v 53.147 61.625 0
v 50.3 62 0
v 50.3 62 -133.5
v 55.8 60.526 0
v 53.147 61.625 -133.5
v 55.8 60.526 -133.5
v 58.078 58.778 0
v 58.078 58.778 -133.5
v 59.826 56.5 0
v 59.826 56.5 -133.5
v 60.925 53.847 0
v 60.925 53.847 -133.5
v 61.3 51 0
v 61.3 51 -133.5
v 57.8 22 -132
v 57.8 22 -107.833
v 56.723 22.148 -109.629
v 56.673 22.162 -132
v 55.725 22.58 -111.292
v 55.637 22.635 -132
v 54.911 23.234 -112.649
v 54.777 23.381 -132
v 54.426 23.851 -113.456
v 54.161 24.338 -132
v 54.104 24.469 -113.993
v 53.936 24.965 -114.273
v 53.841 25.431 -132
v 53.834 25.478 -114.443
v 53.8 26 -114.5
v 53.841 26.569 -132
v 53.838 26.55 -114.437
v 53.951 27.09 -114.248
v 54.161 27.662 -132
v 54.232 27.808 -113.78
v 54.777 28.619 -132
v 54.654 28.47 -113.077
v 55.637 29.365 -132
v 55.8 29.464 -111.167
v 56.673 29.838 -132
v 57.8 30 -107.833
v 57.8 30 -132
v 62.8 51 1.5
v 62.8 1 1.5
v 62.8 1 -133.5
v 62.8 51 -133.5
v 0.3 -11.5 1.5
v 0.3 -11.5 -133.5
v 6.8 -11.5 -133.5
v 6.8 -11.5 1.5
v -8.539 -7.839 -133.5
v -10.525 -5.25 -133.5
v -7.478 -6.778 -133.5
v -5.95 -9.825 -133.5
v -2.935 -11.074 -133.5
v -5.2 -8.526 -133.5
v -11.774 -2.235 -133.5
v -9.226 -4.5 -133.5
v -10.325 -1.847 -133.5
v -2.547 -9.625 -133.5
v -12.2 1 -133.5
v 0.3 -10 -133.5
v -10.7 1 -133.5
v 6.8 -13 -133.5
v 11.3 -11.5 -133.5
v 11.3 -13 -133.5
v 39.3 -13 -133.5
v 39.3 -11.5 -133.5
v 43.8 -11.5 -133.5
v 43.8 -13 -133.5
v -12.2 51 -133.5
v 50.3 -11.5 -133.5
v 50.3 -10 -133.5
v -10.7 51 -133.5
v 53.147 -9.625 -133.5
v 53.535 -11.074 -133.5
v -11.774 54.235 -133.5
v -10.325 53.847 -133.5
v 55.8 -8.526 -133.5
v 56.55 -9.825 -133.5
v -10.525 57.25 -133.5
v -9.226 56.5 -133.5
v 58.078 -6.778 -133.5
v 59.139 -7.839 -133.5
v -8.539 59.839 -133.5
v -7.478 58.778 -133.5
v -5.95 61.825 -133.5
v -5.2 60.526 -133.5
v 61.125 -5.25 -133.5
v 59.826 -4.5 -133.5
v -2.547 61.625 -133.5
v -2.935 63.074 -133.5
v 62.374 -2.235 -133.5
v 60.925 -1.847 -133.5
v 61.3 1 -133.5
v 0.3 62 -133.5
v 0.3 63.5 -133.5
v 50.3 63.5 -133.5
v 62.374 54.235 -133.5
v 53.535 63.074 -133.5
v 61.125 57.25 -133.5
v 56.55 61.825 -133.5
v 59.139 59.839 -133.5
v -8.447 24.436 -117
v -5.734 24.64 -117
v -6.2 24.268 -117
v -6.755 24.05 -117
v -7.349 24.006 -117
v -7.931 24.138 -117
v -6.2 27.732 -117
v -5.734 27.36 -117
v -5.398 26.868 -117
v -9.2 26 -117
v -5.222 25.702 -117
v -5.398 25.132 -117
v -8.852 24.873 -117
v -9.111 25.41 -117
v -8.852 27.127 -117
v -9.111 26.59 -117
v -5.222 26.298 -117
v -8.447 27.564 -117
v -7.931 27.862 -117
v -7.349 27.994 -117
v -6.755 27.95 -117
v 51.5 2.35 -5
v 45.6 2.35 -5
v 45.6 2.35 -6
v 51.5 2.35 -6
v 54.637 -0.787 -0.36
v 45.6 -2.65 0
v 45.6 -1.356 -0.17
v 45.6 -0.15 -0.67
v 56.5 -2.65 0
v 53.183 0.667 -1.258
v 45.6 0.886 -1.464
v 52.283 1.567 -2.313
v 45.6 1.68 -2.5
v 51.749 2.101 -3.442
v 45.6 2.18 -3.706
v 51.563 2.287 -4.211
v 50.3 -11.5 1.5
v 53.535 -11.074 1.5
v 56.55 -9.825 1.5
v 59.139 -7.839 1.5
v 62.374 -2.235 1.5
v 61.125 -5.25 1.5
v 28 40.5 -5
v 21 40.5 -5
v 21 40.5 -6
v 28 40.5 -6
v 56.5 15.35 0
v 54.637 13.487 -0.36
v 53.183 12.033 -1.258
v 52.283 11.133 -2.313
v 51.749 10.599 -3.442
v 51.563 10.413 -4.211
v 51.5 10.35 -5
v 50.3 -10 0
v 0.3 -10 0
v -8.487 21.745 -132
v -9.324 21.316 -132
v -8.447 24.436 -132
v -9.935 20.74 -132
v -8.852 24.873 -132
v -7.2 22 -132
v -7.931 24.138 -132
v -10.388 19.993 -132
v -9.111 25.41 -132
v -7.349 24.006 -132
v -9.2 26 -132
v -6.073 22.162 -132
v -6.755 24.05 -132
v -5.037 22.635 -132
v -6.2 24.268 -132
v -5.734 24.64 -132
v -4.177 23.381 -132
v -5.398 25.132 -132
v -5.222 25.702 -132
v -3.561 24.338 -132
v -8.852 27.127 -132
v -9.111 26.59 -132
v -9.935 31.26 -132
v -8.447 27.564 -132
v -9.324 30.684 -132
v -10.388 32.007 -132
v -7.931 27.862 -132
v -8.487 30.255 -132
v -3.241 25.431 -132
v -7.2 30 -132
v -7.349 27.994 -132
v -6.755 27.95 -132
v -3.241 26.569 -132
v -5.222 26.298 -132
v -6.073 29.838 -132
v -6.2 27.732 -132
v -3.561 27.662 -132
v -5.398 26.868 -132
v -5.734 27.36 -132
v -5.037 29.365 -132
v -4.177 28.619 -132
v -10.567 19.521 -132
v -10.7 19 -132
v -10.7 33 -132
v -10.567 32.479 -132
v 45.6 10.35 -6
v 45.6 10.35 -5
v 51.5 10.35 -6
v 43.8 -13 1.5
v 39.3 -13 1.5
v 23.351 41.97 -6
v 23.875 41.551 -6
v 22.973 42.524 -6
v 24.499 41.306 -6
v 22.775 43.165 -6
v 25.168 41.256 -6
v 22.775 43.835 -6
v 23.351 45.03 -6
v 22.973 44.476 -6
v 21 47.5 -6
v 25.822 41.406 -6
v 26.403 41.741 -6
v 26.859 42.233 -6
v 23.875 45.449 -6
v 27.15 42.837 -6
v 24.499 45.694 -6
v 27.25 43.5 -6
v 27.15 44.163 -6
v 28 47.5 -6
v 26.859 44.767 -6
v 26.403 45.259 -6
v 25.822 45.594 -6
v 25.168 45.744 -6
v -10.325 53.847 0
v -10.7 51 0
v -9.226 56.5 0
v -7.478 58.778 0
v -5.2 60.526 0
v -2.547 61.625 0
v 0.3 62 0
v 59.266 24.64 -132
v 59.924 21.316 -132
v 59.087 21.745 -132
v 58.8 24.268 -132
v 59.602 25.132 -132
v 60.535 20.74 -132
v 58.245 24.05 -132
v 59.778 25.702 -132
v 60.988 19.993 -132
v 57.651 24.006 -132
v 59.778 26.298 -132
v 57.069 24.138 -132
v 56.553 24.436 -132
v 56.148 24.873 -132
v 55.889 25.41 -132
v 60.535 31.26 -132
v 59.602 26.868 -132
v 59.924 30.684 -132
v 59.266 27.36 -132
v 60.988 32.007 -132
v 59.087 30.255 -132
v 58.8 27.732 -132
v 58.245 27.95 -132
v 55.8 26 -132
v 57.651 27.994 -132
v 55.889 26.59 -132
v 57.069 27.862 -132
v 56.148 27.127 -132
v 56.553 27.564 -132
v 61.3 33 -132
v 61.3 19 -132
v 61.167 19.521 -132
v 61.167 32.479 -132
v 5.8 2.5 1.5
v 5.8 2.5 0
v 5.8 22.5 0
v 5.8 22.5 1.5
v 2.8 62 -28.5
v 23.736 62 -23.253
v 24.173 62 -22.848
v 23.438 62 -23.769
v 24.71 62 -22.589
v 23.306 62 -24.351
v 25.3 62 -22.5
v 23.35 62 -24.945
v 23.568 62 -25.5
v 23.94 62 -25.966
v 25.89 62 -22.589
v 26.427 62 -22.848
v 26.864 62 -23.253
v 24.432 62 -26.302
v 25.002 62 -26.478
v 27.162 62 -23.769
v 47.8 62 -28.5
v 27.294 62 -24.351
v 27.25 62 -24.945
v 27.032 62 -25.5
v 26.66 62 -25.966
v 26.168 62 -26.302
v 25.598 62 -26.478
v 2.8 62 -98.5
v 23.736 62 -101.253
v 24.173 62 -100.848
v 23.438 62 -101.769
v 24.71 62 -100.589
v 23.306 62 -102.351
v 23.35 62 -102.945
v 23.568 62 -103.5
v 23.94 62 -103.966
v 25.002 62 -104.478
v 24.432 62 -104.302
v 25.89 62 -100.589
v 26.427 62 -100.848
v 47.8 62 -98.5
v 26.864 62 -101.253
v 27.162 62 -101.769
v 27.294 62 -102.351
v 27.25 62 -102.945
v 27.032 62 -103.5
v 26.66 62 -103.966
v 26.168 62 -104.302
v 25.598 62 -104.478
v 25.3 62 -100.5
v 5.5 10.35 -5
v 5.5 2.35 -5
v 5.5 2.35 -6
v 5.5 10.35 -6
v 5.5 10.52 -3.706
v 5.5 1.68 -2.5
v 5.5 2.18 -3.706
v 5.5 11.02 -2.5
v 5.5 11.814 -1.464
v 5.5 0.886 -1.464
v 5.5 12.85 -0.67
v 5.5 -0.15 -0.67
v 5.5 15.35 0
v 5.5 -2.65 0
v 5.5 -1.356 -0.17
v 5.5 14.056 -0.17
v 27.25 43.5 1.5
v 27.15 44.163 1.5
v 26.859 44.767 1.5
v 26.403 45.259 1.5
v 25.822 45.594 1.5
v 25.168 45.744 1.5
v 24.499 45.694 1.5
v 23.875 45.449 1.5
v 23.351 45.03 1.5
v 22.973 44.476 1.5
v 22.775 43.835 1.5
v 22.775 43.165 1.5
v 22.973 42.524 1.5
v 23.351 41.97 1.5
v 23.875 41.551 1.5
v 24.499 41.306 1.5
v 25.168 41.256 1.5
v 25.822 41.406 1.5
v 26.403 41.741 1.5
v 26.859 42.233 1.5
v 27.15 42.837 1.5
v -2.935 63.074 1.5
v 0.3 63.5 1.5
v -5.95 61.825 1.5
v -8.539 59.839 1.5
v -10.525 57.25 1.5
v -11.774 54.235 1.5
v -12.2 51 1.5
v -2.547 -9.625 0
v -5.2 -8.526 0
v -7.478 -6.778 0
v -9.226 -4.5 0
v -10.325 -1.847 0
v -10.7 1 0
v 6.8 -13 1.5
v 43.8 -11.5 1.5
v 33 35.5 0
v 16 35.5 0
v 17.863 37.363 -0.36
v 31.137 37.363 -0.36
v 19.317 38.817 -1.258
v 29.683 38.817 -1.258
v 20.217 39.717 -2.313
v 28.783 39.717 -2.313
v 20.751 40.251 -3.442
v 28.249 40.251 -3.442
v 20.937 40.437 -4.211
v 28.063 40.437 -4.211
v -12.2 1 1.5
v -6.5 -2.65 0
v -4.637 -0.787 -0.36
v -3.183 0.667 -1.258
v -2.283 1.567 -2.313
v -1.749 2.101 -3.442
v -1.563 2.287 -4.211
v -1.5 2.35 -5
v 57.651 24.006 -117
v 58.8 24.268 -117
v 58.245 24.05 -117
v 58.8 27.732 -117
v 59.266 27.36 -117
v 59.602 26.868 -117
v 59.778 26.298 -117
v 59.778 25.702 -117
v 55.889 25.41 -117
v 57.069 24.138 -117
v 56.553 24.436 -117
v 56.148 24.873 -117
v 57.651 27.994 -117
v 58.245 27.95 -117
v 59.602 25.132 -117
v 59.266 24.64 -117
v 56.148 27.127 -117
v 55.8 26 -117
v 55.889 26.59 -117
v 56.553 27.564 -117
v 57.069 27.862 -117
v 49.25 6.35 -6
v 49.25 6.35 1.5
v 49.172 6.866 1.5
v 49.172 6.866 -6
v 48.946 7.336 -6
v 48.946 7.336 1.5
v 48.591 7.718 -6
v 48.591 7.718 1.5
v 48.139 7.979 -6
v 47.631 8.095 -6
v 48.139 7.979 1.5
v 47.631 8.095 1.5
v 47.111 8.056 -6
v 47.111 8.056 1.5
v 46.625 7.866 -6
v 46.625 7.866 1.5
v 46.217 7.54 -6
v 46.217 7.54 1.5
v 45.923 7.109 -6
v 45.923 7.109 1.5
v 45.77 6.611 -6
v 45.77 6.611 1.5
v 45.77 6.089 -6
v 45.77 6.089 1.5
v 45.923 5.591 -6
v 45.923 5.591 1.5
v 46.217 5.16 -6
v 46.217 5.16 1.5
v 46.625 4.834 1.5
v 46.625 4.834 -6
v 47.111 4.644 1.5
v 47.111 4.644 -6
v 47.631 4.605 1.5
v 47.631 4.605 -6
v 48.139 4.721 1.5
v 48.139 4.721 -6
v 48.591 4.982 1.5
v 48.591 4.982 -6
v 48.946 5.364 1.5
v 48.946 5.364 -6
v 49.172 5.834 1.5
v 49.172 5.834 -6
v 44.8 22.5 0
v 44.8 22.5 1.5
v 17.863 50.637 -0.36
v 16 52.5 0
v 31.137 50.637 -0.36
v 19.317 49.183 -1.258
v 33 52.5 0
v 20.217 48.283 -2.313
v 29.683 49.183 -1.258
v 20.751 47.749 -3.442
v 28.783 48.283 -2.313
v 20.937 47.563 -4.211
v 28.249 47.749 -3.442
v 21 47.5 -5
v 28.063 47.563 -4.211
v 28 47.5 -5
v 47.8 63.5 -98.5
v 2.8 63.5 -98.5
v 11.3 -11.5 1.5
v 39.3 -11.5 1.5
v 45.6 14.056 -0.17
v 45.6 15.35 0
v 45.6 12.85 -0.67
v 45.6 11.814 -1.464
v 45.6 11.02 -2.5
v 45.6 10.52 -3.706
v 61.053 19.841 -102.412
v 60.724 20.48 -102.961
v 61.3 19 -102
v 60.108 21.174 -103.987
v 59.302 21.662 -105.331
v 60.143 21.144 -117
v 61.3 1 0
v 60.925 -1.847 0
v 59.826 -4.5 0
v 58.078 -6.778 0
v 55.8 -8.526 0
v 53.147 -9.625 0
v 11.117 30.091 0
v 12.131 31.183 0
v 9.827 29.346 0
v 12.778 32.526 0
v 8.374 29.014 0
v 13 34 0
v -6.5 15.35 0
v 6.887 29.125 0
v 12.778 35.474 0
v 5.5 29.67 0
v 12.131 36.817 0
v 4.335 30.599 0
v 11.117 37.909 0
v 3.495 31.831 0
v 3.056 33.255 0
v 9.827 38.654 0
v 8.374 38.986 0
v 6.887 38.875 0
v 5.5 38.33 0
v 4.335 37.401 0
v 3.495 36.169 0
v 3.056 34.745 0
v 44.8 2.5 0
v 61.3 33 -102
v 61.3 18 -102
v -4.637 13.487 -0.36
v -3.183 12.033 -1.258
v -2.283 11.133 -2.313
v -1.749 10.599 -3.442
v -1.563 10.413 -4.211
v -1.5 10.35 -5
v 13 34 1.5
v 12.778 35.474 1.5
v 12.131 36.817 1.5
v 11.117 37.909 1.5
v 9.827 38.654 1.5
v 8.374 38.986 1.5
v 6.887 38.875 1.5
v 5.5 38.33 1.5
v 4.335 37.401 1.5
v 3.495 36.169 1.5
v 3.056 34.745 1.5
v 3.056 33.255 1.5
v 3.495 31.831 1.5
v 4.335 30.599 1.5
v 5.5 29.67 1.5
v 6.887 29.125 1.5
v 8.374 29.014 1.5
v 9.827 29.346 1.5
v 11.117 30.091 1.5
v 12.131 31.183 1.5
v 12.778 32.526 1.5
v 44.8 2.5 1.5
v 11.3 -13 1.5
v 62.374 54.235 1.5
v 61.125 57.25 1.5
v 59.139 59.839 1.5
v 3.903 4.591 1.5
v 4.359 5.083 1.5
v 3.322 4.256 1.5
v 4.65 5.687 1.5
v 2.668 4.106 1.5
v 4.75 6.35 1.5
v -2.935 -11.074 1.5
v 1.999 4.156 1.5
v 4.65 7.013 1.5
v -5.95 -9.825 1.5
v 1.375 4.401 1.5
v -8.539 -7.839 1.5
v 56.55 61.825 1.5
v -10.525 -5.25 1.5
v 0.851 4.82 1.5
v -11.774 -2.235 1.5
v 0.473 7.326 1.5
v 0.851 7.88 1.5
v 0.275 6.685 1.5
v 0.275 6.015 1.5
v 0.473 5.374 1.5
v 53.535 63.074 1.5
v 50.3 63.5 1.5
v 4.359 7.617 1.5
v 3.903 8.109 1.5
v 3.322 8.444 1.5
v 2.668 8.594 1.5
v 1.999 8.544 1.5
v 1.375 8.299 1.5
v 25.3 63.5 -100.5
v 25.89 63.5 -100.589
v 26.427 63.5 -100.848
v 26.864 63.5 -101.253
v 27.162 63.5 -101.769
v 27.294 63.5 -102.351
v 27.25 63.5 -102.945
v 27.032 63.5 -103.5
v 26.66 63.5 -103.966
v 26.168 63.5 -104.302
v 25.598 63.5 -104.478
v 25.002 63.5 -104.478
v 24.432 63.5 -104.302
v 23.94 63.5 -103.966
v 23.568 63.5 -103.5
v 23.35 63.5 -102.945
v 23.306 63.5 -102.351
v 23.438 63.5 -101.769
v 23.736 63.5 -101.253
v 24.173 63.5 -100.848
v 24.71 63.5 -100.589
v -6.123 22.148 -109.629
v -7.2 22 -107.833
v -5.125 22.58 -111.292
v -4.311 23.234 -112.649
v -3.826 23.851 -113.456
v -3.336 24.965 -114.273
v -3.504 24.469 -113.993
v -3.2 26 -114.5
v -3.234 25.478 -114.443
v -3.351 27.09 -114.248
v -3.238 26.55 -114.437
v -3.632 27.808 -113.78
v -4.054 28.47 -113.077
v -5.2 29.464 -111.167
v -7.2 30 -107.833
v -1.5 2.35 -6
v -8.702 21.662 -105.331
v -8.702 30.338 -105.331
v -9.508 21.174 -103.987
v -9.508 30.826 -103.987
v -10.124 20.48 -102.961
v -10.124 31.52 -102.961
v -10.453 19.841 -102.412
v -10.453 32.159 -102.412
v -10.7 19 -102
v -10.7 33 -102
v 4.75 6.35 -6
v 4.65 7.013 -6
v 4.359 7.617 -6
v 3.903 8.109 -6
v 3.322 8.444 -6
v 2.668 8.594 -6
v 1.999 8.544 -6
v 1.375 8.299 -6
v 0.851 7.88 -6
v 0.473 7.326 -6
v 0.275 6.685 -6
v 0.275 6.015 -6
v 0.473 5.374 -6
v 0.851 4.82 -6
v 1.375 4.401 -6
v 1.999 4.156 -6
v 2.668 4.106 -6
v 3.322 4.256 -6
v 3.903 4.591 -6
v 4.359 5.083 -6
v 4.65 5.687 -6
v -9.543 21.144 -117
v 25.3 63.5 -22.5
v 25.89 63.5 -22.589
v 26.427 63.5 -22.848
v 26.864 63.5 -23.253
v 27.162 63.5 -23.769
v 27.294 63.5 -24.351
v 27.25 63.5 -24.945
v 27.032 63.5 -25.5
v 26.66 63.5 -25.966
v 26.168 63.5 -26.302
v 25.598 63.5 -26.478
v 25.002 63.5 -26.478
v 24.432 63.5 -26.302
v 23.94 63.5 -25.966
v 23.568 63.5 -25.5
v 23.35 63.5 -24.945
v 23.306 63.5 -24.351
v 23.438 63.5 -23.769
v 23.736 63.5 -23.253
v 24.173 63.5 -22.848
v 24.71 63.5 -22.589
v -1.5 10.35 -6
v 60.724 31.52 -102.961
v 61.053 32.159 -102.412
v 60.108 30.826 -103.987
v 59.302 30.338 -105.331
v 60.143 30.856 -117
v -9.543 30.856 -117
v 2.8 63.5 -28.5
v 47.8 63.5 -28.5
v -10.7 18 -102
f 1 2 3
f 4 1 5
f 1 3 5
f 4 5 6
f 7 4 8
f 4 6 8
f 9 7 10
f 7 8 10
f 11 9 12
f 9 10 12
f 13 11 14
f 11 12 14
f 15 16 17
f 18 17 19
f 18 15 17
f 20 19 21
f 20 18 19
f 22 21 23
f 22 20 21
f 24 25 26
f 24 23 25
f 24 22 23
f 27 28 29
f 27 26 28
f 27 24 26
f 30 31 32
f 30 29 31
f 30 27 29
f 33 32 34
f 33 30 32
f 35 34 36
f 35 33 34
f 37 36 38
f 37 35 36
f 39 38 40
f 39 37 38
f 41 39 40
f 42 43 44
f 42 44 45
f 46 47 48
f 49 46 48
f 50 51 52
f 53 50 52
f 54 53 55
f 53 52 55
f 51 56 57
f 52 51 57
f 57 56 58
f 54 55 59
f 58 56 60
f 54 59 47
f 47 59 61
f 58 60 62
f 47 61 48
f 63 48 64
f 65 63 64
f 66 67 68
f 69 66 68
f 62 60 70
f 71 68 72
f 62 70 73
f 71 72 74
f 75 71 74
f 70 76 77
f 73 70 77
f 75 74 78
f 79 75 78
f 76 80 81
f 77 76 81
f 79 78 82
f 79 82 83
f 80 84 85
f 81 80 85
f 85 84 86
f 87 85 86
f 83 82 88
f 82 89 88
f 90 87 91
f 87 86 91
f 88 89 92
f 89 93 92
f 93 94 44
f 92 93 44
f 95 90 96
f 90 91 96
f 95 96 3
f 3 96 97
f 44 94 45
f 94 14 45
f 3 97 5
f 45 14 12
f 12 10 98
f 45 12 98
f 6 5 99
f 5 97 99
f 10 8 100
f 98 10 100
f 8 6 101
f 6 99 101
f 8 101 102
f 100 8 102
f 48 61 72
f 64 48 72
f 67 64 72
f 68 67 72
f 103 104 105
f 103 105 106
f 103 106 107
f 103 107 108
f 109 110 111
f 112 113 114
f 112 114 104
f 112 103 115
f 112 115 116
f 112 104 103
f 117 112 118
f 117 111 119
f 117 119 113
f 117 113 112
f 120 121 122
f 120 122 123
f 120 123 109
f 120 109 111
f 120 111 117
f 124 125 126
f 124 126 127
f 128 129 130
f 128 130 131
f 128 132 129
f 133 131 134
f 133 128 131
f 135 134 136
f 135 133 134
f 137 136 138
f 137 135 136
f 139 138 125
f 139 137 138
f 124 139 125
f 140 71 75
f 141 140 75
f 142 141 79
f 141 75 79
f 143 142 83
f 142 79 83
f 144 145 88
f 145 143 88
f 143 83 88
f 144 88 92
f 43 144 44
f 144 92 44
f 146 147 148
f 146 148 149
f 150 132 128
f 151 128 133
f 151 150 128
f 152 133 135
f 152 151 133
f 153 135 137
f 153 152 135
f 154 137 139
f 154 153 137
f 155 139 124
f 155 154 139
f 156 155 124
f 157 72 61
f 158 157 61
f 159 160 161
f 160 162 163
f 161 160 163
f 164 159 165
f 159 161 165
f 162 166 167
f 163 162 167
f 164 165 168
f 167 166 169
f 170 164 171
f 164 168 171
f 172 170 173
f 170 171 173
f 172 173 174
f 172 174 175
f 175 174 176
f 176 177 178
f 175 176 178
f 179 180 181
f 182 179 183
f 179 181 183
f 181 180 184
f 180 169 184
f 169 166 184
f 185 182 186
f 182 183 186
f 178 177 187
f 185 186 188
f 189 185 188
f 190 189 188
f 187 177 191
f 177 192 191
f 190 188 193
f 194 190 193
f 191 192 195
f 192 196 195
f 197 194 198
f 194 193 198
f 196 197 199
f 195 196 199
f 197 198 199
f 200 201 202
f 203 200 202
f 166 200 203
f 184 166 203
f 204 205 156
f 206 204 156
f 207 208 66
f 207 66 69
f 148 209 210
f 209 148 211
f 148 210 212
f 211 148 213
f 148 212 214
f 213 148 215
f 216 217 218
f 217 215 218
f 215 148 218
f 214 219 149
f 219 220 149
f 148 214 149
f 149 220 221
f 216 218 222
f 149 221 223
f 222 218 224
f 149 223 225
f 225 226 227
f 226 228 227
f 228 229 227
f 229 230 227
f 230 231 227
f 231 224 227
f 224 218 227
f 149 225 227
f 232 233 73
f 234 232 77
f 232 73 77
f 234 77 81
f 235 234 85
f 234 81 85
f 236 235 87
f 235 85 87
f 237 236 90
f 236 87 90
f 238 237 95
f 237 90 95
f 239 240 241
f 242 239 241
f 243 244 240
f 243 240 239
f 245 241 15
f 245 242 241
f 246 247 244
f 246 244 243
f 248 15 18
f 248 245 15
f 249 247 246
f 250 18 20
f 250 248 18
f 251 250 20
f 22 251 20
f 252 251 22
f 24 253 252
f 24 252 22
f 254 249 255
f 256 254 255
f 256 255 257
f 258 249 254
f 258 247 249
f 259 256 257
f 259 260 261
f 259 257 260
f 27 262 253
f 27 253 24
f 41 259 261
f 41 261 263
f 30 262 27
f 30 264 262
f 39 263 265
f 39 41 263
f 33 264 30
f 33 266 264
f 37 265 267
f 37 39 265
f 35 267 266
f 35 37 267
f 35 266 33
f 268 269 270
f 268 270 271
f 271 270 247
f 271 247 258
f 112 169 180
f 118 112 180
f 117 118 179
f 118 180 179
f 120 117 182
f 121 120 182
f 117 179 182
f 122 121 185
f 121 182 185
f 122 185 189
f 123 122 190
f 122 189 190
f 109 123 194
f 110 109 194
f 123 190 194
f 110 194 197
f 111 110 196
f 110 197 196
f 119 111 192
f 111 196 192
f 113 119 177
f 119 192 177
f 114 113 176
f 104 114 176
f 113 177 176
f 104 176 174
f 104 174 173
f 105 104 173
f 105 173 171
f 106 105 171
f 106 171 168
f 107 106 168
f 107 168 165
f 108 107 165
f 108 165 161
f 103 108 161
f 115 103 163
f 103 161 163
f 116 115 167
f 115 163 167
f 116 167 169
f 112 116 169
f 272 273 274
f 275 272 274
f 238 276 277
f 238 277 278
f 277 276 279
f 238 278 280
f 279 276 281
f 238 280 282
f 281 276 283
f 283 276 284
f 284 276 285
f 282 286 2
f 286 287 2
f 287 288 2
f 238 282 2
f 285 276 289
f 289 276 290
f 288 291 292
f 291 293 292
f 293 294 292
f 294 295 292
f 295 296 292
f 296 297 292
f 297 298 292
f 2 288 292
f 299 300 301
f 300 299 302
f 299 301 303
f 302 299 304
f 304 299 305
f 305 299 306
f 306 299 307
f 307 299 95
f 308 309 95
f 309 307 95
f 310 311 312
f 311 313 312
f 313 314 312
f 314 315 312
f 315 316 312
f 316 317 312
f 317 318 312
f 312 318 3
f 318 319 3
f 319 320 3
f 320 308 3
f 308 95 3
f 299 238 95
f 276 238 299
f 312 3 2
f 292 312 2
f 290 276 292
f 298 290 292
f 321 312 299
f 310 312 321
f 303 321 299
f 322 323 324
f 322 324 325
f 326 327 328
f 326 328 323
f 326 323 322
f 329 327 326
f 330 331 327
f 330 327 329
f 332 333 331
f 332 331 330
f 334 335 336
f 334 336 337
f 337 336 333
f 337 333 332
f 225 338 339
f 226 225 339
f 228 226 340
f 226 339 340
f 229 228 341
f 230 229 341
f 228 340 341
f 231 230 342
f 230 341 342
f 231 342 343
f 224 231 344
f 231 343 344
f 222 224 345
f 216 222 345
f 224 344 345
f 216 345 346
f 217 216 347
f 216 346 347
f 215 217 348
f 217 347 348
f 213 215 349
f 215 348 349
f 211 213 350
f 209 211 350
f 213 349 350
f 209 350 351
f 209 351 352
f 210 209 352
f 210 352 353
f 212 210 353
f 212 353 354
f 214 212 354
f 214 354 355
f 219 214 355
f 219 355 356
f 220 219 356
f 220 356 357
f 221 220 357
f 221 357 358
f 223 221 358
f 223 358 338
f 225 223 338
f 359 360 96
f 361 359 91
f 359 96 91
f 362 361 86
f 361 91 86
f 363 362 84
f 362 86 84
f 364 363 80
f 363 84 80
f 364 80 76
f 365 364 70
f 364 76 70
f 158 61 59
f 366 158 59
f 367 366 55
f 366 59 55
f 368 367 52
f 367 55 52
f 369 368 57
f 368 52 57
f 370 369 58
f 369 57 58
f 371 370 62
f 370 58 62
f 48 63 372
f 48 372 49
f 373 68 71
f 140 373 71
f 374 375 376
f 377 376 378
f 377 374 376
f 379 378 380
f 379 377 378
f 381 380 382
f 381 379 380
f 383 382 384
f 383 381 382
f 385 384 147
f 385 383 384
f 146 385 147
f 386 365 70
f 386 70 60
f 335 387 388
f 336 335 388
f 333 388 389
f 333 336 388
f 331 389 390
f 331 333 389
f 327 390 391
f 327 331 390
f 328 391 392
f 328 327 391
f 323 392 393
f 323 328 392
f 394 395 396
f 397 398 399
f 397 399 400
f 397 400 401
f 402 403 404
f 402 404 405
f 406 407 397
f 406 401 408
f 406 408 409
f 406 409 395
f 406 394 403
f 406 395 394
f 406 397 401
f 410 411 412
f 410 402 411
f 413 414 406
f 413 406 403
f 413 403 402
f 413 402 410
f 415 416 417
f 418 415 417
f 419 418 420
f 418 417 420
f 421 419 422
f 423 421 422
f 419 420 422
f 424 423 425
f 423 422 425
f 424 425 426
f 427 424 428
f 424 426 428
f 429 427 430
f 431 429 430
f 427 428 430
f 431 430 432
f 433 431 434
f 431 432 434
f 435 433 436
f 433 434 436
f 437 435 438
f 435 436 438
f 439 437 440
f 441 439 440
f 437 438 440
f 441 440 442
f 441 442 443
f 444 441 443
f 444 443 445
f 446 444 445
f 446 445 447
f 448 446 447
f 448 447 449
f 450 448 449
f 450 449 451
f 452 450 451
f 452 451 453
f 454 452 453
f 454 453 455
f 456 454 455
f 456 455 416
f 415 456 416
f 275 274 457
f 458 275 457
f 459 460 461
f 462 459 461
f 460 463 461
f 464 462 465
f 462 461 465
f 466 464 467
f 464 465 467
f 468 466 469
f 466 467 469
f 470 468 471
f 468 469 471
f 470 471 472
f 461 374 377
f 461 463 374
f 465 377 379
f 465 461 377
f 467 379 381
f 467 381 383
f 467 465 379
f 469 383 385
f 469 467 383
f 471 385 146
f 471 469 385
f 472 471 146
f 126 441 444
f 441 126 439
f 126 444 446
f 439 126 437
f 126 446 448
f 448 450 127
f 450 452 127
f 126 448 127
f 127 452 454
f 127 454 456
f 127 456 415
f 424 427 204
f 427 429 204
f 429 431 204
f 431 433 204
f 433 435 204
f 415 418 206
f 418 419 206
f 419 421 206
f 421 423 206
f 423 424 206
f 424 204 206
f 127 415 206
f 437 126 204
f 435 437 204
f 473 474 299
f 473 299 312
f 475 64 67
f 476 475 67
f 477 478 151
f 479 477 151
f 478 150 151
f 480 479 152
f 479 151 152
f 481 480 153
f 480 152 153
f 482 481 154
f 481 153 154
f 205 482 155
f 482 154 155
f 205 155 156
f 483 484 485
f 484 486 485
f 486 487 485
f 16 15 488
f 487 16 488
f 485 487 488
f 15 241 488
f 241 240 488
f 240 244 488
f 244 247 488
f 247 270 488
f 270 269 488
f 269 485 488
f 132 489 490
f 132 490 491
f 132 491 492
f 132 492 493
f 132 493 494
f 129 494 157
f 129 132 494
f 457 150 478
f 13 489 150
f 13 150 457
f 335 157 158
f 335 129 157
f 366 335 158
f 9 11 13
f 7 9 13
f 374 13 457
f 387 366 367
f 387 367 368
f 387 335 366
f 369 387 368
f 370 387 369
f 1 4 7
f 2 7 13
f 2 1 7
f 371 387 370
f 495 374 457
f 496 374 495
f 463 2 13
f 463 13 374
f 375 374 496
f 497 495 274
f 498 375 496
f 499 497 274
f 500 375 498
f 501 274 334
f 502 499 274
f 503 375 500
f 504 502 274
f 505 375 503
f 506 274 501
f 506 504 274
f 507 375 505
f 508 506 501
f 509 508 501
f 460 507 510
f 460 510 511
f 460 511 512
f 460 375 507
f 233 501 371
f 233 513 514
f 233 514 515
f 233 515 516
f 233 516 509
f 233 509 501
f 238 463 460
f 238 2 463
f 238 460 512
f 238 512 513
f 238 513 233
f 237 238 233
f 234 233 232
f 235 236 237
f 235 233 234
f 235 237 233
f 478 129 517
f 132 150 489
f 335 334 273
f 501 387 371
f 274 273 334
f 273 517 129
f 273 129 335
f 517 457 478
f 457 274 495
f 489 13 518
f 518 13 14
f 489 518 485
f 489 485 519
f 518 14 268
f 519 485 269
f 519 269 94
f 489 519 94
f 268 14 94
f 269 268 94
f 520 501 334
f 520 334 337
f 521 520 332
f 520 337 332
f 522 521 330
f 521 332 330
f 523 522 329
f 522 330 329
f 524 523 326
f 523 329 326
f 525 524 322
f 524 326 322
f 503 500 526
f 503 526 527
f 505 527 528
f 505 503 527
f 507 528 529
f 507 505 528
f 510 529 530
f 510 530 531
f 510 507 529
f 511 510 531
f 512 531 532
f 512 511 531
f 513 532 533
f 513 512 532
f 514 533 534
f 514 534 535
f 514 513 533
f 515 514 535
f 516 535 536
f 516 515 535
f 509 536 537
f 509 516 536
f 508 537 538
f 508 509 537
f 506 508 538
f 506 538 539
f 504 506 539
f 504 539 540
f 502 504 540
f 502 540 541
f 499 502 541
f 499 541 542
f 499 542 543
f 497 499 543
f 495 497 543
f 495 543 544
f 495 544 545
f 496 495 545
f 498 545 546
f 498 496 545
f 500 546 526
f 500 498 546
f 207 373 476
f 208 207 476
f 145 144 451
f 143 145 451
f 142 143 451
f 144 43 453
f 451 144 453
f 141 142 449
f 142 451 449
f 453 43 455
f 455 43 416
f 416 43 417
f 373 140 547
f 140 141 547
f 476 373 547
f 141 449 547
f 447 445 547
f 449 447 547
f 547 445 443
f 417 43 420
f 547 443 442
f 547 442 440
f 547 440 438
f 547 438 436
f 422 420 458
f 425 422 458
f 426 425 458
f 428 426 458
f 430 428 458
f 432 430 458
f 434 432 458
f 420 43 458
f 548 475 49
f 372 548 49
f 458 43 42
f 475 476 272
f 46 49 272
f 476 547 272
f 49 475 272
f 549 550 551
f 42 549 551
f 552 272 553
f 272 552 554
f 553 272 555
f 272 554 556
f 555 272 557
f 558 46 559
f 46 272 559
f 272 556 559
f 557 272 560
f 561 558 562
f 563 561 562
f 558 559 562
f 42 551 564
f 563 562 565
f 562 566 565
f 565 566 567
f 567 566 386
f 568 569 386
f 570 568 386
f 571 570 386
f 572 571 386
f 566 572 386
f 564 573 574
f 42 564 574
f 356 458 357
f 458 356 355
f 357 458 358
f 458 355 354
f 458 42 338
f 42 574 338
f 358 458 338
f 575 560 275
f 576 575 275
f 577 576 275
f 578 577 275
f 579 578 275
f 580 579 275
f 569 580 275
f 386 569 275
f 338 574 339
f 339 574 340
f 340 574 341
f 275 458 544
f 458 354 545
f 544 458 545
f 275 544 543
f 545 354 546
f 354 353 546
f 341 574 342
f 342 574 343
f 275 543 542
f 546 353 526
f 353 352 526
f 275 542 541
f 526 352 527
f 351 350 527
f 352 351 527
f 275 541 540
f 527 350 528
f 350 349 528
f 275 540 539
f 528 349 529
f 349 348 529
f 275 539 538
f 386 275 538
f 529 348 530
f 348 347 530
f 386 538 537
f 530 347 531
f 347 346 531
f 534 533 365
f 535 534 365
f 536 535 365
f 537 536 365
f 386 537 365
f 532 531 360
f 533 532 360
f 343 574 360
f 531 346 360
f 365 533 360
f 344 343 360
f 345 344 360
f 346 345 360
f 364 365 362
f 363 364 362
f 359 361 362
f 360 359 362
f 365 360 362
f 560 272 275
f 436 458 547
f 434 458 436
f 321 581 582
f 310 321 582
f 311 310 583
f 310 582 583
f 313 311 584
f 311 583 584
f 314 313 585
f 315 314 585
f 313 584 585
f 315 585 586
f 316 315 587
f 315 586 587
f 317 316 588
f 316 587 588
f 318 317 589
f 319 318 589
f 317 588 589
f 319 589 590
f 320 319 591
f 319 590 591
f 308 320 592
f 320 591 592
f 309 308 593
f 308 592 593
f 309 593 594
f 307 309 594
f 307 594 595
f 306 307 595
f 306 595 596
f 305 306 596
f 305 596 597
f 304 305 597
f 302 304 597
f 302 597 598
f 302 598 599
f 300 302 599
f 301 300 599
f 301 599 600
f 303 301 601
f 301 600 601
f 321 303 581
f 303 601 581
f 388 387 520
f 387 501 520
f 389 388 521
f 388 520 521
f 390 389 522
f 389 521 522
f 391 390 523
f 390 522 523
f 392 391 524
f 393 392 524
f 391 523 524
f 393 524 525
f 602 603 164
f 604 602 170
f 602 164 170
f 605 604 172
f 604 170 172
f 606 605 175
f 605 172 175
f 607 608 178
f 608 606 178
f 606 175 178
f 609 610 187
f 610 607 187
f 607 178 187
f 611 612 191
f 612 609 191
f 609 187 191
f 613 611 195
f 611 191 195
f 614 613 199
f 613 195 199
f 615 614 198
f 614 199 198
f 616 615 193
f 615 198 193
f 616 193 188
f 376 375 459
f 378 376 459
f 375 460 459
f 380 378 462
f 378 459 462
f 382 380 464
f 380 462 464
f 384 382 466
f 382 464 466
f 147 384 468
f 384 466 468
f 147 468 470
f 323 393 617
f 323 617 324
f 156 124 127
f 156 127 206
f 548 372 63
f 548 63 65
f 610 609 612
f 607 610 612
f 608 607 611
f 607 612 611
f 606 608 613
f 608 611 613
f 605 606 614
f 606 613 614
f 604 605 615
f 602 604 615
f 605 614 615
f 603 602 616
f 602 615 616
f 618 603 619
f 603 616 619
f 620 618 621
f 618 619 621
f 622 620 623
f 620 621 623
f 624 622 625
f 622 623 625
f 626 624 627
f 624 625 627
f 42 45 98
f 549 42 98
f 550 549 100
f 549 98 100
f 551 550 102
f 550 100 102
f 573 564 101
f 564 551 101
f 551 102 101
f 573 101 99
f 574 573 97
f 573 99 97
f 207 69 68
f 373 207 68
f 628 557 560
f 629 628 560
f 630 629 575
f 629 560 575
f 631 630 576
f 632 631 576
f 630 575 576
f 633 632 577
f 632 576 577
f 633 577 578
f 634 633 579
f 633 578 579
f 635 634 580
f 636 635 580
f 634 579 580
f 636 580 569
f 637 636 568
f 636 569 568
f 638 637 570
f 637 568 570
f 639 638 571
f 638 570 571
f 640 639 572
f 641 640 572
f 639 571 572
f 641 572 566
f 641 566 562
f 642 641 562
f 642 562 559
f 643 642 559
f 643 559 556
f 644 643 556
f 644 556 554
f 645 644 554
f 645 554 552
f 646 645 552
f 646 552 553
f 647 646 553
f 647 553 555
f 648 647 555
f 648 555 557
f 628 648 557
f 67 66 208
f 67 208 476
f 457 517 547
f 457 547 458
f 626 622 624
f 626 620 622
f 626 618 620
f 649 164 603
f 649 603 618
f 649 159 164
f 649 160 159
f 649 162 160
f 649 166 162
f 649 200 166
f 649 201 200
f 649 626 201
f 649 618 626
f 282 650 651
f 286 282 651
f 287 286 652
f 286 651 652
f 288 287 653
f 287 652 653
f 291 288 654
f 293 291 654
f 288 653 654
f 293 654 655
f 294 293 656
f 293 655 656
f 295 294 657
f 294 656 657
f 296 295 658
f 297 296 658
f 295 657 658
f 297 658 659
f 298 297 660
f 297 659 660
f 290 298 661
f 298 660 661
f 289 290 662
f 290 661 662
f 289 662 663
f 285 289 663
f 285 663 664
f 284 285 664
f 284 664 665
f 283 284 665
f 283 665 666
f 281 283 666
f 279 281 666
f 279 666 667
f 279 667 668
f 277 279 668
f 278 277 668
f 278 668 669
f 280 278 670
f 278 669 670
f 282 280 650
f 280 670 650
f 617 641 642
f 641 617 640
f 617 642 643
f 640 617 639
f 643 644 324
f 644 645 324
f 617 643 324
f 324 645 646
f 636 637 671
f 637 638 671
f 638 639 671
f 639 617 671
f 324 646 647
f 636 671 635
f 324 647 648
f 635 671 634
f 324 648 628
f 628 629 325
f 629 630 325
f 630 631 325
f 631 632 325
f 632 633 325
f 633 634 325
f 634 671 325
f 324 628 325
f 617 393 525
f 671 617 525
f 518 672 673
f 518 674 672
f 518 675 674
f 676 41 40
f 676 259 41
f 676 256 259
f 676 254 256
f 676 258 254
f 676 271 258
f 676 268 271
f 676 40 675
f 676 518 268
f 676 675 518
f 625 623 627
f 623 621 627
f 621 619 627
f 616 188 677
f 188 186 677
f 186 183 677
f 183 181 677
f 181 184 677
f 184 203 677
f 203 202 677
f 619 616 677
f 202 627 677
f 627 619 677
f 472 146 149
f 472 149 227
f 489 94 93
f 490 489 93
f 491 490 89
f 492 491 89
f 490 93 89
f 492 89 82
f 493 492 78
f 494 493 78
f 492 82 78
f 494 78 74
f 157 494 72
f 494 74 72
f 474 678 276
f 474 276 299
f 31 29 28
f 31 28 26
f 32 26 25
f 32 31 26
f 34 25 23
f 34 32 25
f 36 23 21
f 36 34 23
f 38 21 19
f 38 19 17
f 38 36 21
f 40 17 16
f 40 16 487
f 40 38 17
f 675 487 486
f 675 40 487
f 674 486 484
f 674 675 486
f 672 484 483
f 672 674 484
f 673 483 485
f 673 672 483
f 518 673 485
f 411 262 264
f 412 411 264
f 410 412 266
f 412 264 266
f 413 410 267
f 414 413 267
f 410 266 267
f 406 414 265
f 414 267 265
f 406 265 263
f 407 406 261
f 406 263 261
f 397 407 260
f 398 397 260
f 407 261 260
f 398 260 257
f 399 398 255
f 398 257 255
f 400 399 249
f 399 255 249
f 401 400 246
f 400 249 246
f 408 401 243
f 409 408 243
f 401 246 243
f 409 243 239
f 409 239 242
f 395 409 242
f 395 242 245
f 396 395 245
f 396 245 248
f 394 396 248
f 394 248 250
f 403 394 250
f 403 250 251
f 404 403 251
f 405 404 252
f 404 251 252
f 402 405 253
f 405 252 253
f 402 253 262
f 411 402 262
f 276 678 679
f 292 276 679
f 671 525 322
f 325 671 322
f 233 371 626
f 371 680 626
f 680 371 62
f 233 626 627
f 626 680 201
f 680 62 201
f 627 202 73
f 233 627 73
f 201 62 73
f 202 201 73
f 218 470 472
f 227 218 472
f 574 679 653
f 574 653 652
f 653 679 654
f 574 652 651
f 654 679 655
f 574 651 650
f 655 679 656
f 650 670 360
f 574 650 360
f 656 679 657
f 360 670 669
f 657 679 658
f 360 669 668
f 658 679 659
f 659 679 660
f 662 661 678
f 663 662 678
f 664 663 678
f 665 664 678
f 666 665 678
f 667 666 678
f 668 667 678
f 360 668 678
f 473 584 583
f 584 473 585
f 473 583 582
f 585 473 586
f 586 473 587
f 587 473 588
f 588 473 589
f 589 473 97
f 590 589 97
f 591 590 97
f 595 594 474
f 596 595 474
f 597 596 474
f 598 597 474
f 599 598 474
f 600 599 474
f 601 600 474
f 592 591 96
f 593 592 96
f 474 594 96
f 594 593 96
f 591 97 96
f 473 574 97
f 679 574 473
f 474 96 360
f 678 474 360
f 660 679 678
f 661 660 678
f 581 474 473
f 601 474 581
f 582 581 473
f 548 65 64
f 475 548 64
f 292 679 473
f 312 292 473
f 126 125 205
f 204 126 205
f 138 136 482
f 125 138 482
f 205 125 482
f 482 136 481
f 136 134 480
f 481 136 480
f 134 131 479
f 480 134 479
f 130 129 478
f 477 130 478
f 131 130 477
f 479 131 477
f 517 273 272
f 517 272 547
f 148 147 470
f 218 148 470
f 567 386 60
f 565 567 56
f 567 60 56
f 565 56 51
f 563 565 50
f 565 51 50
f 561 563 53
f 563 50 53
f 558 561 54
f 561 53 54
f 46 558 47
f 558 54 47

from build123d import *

# Parameters (mm, degrees)
SKETCH1_R           = 5
SKETCH1_W           = 39
SKETCH1_H           = 20
BOSS_EXTRUDE1_DEPTH = 1.5
BOSS_EXTRUDE3_START = 133.5
BOSS_EXTRUDE3_DEPTH = 133.5
BOSS_EXTRUDE4_DEPTH = 30
CUT_EXTRUDE1_DEPTH  = 15
CUT_EXTRUDE2_DEPTH  = 15
SKETCH7_R           = 2
CUT_EXTRUDE3_DEPTH  = 15
SKETCH10_W          = 45
SKETCH10_H          = 70
CUT_EXTRUDE4_DEPTH  = 1.5
SKETCH11_R          = 2
CUT_EXTRUDE6_DEPTH  = 1.5
SKETCH15_W          = 7
SKETCH15_H          = 7
SKETCH15_W_2        = 5.9
SKETCH15_H_2        = 8
BOSS_EXTRUDE5_DEPTH = 6
SKETCH16_R          = 2.25
SKETCH16_R_2        = 1.75
CUT_EXTRUDE20_DEPTH = 10
FILLET5_R           = 5
FILLET6_R           = 5
FILLET7_R           = 5
SKETCH17_W          = 4.5
SKETCH17_H          = 1.5
BOSS_EXTRUDE6_DEPTH = 135


with BuildPart() as part:
    # Sketch1 → Boss-Extrude1 (new body)
    with BuildSketch(Plane.XY):
        with BuildLine():
            Line((50.3, -11.5), (0.3, -11.5))
            ThreePointArc((0.3, -11.5), (-8.538834765, -7.838834765), (-12.2, 1))
            Line((-12.2, 1), (-12.2, 51))
            ThreePointArc((-12.2, 51), (-8.538834765, 59.838834765), (0.3, 63.5))
            Line((0.3, 63.5), (50.3, 63.5))
            ThreePointArc((50.3, 63.5), (59.138834765, 59.838834765), (62.8, 51))
            Line((62.8, 51), (62.8, 1))
            ThreePointArc((62.8, 1), (59.138834765, -7.838834765), (50.3, -11.5))
        make_face()
        with Locations((8, 34)):
            Circle(SKETCH1_R, mode=Mode.SUBTRACT)
        with Locations((25.3, 12.5)):
            Rectangle(SKETCH1_W, SKETCH1_H, mode=Mode.SUBTRACT)
    extrude(amount=BOSS_EXTRUDE1_DEPTH)

    # Sketch3 → Boss-Extrude3 (add)
    with BuildSketch(Plane(origin=(0, 0, 0), x_dir=(-1, 0, 0), z_dir=(0, 0, -1)).offset(BOSS_EXTRUDE3_START)):
        with BuildLine():
            Line((-50.3, 63.5), (-0.3, 63.5))
            ThreePointArc((-0.3, 63.5), (8.538834765, 59.838834765), (12.2, 51))
            Line((12.2, 51), (12.2, 1))
            ThreePointArc((12.2, 1), (8.538834765, -7.838834765), (-0.3, -11.5))
            Line((-0.3, -11.5), (-50.3, -11.5))
            ThreePointArc((-50.3, -11.5), (-59.138834765, -7.838834765), (-62.8, 1))
            Line((-62.8, 1), (-62.8, 51))
            ThreePointArc((-62.8, 51), (-59.138834765, 59.838834765), (-50.3, 63.5))
        make_face()
        with BuildLine():
            Line((10.7, 1), (10.7, 51))
            ThreePointArc((10.7, 51), (7.478174593, 58.778174593), (-0.3, 62))
            Line((-0.3, 62), (-50.3, 62))
            ThreePointArc((-50.3, 62), (-58.078174593, 58.778174593), (-61.3, 51))
            Line((-61.3, 51), (-61.3, 1))
            ThreePointArc((-61.3, 1), (-58.078174593, -6.778174593), (-50.3, -10))
            Line((-50.3, -10), (-0.3, -10))
            ThreePointArc((-0.3, -10), (7.478174593, -6.778174593), (10.7, 1))
        make_face(mode=Mode.SUBTRACT)
    extrude(amount=-BOSS_EXTRUDE3_DEPTH)

    # Sketch4 → Boss-Extrude4 (add)
    with BuildSketch(Plane(origin=(0, 0, -132), x_dir=(-1, 0, 0), z_dir=(0, 0, -1))):
        with BuildLine():
            Line((-61.3, 33), (-61.3, 19))
            add(Edge.make_bspline(
                [(-57.8, 22), (-60.735988769, 21.788932059), (-61.3, 19)],
                knots=[0, 0, 0, 1, 1, 1], degree=2))
            ThreePointArc((-57.8, 22), (-53.8, 26), (-57.8, 30))
            add(Edge.make_bspline(
                [(-57.8, 30), (-60.735988769, 30.211067941), (-61.3, 33)],
                knots=[0, 0, 0, 1, 1, 1], degree=2))
        make_face()
        with BuildLine():
            Line((10.7, 33), (10.7, 19))
            add(Edge.make_bspline(
                [(7.2, 22), (10.135988769, 21.788932059), (10.7, 19)],
                knots=[0, 0, 0, 1, 1, 1], degree=2))
            ThreePointArc((7.2, 22), (3.2, 26), (7.2, 30))
            add(Edge.make_bspline(
                [(7.2, 30), (10.135988769, 30.211067941), (10.7, 33)],
                knots=[0, 0, 0, 1, 1, 1], degree=2))
        make_face()
    extrude(amount=-BOSS_EXTRUDE4_DEPTH)

    # Sketch5 → Cut-Extrude1 (cut)
    with BuildSketch(Plane(origin=(0, 33, 0), x_dir=(-1, 0, 0), z_dir=(0, -1, 0))):
        Polygon((10.7, 102), (3.2, 102), (3.2, 114.5), align=None)
    extrude(amount=CUT_EXTRUDE1_DEPTH, mode=Mode.SUBTRACT)

    # Sketch6 → Cut-Extrude2 (cut)
    with BuildSketch(Plane(origin=(0, 33, 0), x_dir=(-1, 0, 0), z_dir=(0, -1, 0))):
        Polygon((-61.3, 102), (-53.8, 102), (-53.8, 114.5), align=None)
    extrude(amount=CUT_EXTRUDE2_DEPTH, mode=Mode.SUBTRACT)

    # Sketch7 → Cut-Extrude3 (cut)
    with BuildSketch(Plane(origin=(0, 0, -132), x_dir=(-1, 0, 0), z_dir=(0, 0, -1))):
        with Locations((-57.8, 26)):
            Circle(SKETCH7_R)
        with Locations((7.2, 26)):
            Circle(SKETCH7_R)
    extrude(amount=-CUT_EXTRUDE3_DEPTH, mode=Mode.SUBTRACT)

    # Sketch10 → Cut-Extrude4 (cut)
    with BuildSketch(Plane(origin=(0, 63.5, 0), x_dir=(1, 0, 0), z_dir=(0, 1, 0))):
        with Locations((25.3, 63.5)):
            Rectangle(SKETCH10_W, SKETCH10_H)
    extrude(amount=-CUT_EXTRUDE4_DEPTH, mode=Mode.SUBTRACT)

    # Sketch11 → Cut-Extrude6 (cut)
    with BuildSketch(Plane(origin=(0, 63.5, 0), x_dir=(1, 0, 0), z_dir=(0, 1, 0))):
        with Locations(Location((25.3, 102.5, 0), (0, 0, 270))):
            Circle(SKETCH11_R)
        with Locations(Location((25.3, 24.5, 0), (0, 0, 270))):
            Circle(SKETCH11_R)
    extrude(amount=-CUT_EXTRUDE6_DEPTH, mode=Mode.SUBTRACT)

    # Sketch15 → Boss-Extrude5 (add)
    with BuildSketch(Plane.XY):
        with Locations((24.5, 44)):
            Rectangle(SKETCH15_W, SKETCH15_H)
        with Locations((48.55, 6.35)):
            Rectangle(SKETCH15_W_2, SKETCH15_H_2)
        with Locations((2, 6.35)):
            Rectangle(SKETCH15_W, SKETCH15_H_2)
    extrude(amount=-BOSS_EXTRUDE5_DEPTH)

    # Sketch16 → Cut-Extrude20 (cut)
    with BuildSketch(Plane.XY.offset(1.5)):
        with Locations((25, 43.5)):
            Circle(SKETCH16_R)
        with Locations((47.5, 6.35)):
            Circle(SKETCH16_R_2)
        with Locations((2.5, 6.35)):
            Circle(SKETCH16_R)
    extrude(amount=-CUT_EXTRUDE20_DEPTH, mode=Mode.SUBTRACT)

    # Fillet5
    fillet5_edges = [part.edges().sort_by_distance(p)[0] for p in [
        (-1.5, 6.35, 0),
        (2, 2.35, 0),
        (2, 10.35, 0),
    ]]
    fillet(fillet5_edges, radius=FILLET5_R)

    # Fillet6
    fillet6_edges = [part.edges().sort_by_distance(p)[0] for p in [
        (51.5, 6.35, 0),
        (48.55, 10.35, 0),
        (48.55, 2.35, 0),
    ]]
    fillet(fillet6_edges, radius=FILLET6_R)

    # Fillet7
    fillet7_edges = [part.edges().sort_by_distance(p)[0] for p in [
        (21, 44, 0),
        (24.5, 40.5, 0),
        (28, 44, 0),
        (24.5, 47.5, 0),
    ]]
    fillet(fillet7_edges, radius=FILLET7_R)

    # Sketch17 → Boss-Extrude6 (add)
    with BuildSketch(Plane.XY.offset(1.5)):
        with Locations((41.55, -12.25)):
            Rectangle(SKETCH17_W, SKETCH17_H)
        with Locations((9.05, -12.25)):
            Rectangle(SKETCH17_W, SKETCH17_H)
    extrude(amount=-BOSS_EXTRUDE6_DEPTH)


solid = part.part
